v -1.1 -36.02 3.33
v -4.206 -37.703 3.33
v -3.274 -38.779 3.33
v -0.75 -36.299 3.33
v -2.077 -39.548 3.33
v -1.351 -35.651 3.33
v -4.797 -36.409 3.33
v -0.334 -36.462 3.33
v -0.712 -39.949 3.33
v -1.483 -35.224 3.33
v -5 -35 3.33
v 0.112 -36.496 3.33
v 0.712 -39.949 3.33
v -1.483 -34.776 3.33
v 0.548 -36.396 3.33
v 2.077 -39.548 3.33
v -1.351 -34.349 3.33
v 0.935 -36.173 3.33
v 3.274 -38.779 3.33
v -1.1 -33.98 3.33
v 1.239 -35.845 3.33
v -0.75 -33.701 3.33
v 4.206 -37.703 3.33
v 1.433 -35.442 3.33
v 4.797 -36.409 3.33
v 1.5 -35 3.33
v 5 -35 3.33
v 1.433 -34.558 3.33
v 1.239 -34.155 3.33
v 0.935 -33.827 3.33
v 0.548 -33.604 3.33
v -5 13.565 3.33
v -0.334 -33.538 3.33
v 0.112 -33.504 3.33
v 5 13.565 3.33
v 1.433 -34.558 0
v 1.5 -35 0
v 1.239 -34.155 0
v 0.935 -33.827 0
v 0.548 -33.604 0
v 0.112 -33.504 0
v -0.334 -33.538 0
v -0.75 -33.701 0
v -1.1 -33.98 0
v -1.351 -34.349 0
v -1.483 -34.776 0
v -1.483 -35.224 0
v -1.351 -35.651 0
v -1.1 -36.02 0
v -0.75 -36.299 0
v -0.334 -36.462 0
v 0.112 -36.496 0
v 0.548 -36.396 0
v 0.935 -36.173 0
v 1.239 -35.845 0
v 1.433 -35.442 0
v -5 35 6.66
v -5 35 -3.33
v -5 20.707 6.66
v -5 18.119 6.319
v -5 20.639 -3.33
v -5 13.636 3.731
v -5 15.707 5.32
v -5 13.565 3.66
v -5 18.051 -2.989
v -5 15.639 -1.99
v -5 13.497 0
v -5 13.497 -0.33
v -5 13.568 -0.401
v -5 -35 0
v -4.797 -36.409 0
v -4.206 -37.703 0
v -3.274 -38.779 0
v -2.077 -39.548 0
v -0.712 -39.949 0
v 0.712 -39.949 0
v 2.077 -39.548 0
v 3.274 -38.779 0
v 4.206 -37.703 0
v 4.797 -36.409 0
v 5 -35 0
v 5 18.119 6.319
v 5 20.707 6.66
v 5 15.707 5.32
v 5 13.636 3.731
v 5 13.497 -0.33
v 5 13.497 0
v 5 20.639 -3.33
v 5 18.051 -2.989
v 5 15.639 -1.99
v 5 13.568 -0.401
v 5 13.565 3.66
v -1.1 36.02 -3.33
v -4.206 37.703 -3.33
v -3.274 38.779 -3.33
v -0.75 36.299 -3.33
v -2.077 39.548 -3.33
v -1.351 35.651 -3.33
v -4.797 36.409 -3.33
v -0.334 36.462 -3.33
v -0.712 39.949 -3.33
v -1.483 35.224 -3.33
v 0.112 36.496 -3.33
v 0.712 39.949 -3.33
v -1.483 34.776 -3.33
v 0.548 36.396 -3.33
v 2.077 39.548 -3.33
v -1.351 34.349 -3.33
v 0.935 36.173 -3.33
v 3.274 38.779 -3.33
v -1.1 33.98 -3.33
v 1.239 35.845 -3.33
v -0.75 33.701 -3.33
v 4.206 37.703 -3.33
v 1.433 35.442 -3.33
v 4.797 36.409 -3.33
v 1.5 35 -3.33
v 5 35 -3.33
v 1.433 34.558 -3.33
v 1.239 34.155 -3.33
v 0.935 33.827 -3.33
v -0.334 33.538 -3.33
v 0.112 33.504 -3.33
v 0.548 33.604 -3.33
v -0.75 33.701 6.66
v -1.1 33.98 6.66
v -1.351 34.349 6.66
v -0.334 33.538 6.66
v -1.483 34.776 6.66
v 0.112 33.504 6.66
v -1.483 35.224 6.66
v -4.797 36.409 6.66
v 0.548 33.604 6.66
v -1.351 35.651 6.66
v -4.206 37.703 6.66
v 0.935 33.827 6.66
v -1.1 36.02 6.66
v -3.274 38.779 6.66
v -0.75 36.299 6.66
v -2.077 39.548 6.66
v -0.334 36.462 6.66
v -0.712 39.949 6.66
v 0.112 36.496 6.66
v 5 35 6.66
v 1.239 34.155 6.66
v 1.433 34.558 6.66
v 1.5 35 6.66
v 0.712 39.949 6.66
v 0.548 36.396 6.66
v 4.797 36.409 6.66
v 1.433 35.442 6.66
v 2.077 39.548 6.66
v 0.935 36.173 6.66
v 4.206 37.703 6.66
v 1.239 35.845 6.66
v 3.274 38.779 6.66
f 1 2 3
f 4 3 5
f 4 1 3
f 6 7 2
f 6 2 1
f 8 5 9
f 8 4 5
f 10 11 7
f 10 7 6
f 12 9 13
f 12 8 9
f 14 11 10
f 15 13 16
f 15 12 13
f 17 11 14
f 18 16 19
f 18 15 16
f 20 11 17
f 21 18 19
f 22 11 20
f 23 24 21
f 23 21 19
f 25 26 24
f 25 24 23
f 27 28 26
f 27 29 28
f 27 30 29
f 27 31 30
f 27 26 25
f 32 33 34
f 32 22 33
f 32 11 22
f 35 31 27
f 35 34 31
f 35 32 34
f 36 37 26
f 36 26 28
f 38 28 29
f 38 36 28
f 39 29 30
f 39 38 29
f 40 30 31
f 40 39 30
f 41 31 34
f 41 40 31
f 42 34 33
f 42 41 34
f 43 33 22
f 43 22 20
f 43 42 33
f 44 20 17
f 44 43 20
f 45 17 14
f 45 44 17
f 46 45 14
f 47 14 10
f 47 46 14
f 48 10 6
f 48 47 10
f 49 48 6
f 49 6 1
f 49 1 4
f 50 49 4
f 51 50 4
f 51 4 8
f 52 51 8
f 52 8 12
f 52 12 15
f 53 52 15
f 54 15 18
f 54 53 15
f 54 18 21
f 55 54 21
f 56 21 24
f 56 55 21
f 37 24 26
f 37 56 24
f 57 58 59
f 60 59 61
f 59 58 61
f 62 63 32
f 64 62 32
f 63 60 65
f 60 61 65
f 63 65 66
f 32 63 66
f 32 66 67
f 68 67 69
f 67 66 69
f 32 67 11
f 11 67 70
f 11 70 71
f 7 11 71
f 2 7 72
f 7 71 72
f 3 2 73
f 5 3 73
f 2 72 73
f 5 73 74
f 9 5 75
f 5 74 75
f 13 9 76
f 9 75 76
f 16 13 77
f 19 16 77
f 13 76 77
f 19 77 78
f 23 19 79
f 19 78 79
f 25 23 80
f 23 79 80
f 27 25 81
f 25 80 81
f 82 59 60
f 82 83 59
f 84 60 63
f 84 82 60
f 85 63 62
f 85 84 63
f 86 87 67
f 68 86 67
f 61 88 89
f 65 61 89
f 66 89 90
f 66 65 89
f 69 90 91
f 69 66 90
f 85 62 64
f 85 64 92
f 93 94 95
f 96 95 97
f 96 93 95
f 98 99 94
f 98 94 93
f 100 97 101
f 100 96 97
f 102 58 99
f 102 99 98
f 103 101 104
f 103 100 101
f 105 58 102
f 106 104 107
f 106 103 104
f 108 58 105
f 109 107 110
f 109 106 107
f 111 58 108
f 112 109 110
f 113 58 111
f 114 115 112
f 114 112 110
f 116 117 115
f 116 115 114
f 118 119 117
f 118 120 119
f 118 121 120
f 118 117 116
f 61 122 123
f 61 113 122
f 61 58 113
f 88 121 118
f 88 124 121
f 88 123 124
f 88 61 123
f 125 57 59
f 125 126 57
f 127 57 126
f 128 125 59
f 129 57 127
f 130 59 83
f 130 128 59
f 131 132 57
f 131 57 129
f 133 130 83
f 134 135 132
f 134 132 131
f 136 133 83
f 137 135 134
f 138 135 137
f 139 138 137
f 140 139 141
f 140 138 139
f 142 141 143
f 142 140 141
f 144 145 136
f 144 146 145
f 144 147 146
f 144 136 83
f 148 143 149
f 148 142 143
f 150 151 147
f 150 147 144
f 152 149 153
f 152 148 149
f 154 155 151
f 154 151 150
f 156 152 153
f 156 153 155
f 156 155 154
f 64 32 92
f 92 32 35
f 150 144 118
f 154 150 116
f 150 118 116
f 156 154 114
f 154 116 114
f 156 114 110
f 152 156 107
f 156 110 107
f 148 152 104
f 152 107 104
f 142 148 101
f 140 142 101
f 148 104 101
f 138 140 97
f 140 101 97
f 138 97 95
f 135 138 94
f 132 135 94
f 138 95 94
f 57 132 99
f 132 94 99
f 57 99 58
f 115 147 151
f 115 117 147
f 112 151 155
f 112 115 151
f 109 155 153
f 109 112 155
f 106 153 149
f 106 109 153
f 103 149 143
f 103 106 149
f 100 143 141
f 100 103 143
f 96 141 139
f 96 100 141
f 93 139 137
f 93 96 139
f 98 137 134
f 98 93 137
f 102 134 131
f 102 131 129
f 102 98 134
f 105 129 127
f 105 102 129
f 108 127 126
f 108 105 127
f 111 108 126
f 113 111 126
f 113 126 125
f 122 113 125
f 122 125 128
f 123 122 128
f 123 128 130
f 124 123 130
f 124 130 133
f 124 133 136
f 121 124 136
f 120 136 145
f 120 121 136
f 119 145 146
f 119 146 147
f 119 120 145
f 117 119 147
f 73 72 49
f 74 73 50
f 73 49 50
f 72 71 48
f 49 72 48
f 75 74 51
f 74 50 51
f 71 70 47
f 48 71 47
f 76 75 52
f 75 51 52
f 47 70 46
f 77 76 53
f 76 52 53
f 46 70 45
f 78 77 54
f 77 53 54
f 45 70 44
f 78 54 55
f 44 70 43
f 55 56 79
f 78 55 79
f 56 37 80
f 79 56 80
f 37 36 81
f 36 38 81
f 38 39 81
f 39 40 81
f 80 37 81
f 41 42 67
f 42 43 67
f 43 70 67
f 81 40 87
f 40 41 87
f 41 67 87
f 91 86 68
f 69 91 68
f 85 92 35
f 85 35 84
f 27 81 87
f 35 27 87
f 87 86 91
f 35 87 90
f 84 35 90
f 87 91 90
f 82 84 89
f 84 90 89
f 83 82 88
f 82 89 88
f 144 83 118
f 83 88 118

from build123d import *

# Parameters (mm, degrees)
F0_R     = 1.5
F1_DEPTH = 3.33
F3_R     = 1.5
F4_DEPTH = 3.33
F2_R     = 1.5
F5_DEPTH = 3.33
F6_SIZE  = 3
F7_R     = 10
F8_SIZE  = 3
F9_R     = 10


with BuildPart() as f1:
    # F0 (on Top) → F1 (new body)
    with BuildSketch(Plane.XY):
        with BuildLine():
            ThreePointArc((-5, -35), (0, -40), (5, -35))
            Line((5, -35), (5, 35))
            ThreePointArc((5, 35), (0, 40), (-5, 35))
            Line((-5, 35), (-5, -35))
        make_face()
        with Locations((0, -35)):
            Circle(F0_R, mode=Mode.SUBTRACT)
        with Locations((0, 35)):
            Circle(F0_R, mode=Mode.SUBTRACT)
    extrude(amount=F1_DEPTH)

    # F3 (on face) → F4 (join)
    with BuildSketch(Plane(origin=(0, 0, 0), x_dir=(1, 0, 0), z_dir=(0, 0, -1))):
        with BuildLine():
            Line((5, -35), (5, -13.4968720376))
            Line((5, -13.4968720376), (-5, -13.4968720376))
            Line((-5, -13.4968720376), (-5, -35))
            ThreePointArc((-5, -35), (0, -40), (5, -35))
        make_face()
        with Locations((0, -35)):
            Circle(F3_R, mode=Mode.SUBTRACT)
    extrude(amount=F4_DEPTH)

    # F2 (on face) → F5 (join)
    with BuildSketch(Plane.XY.offset(3.33)):
        with BuildLine():
            Line((-5, 35), (-5, 13.5650867596))
            Line((-5, 13.5650867596), (5, 13.5650867596))
            Line((5, 13.5650867596), (5, 35))
            ThreePointArc((5, 35), (0, 40), (-5, 35))
        make_face()
        with Locations((0, 35)):
            Circle(F2_R, mode=Mode.SUBTRACT)
    extrude(amount=F5_DEPTH)

    # F6
    f6_edges = [f1.edges().sort_by_distance(p)[0] for p in [
        (0, 13.565087, 6.66),
    ]]
    chamfer(f6_edges, length=F6_SIZE)

    # F7
    f7_edges = [f1.edges().sort_by_distance(p)[0] for p in [
        (0, 16.565087, 6.66),
    ]]
    fillet(f7_edges, radius=F7_R)

    # F8
    f8_edges = [f1.edges().sort_by_distance(p)[0] for p in [
        (0, 13.496872, -3.33),
    ]]
    chamfer(f8_edges, length=F8_SIZE)

    # F9
    f9_edges = [f1.edges().sort_by_distance(p)[0] for p in [
        (0, 16.496872, -3.33),
    ]]
    fillet(f9_edges, radius=F9_R)


solid = f1.part
